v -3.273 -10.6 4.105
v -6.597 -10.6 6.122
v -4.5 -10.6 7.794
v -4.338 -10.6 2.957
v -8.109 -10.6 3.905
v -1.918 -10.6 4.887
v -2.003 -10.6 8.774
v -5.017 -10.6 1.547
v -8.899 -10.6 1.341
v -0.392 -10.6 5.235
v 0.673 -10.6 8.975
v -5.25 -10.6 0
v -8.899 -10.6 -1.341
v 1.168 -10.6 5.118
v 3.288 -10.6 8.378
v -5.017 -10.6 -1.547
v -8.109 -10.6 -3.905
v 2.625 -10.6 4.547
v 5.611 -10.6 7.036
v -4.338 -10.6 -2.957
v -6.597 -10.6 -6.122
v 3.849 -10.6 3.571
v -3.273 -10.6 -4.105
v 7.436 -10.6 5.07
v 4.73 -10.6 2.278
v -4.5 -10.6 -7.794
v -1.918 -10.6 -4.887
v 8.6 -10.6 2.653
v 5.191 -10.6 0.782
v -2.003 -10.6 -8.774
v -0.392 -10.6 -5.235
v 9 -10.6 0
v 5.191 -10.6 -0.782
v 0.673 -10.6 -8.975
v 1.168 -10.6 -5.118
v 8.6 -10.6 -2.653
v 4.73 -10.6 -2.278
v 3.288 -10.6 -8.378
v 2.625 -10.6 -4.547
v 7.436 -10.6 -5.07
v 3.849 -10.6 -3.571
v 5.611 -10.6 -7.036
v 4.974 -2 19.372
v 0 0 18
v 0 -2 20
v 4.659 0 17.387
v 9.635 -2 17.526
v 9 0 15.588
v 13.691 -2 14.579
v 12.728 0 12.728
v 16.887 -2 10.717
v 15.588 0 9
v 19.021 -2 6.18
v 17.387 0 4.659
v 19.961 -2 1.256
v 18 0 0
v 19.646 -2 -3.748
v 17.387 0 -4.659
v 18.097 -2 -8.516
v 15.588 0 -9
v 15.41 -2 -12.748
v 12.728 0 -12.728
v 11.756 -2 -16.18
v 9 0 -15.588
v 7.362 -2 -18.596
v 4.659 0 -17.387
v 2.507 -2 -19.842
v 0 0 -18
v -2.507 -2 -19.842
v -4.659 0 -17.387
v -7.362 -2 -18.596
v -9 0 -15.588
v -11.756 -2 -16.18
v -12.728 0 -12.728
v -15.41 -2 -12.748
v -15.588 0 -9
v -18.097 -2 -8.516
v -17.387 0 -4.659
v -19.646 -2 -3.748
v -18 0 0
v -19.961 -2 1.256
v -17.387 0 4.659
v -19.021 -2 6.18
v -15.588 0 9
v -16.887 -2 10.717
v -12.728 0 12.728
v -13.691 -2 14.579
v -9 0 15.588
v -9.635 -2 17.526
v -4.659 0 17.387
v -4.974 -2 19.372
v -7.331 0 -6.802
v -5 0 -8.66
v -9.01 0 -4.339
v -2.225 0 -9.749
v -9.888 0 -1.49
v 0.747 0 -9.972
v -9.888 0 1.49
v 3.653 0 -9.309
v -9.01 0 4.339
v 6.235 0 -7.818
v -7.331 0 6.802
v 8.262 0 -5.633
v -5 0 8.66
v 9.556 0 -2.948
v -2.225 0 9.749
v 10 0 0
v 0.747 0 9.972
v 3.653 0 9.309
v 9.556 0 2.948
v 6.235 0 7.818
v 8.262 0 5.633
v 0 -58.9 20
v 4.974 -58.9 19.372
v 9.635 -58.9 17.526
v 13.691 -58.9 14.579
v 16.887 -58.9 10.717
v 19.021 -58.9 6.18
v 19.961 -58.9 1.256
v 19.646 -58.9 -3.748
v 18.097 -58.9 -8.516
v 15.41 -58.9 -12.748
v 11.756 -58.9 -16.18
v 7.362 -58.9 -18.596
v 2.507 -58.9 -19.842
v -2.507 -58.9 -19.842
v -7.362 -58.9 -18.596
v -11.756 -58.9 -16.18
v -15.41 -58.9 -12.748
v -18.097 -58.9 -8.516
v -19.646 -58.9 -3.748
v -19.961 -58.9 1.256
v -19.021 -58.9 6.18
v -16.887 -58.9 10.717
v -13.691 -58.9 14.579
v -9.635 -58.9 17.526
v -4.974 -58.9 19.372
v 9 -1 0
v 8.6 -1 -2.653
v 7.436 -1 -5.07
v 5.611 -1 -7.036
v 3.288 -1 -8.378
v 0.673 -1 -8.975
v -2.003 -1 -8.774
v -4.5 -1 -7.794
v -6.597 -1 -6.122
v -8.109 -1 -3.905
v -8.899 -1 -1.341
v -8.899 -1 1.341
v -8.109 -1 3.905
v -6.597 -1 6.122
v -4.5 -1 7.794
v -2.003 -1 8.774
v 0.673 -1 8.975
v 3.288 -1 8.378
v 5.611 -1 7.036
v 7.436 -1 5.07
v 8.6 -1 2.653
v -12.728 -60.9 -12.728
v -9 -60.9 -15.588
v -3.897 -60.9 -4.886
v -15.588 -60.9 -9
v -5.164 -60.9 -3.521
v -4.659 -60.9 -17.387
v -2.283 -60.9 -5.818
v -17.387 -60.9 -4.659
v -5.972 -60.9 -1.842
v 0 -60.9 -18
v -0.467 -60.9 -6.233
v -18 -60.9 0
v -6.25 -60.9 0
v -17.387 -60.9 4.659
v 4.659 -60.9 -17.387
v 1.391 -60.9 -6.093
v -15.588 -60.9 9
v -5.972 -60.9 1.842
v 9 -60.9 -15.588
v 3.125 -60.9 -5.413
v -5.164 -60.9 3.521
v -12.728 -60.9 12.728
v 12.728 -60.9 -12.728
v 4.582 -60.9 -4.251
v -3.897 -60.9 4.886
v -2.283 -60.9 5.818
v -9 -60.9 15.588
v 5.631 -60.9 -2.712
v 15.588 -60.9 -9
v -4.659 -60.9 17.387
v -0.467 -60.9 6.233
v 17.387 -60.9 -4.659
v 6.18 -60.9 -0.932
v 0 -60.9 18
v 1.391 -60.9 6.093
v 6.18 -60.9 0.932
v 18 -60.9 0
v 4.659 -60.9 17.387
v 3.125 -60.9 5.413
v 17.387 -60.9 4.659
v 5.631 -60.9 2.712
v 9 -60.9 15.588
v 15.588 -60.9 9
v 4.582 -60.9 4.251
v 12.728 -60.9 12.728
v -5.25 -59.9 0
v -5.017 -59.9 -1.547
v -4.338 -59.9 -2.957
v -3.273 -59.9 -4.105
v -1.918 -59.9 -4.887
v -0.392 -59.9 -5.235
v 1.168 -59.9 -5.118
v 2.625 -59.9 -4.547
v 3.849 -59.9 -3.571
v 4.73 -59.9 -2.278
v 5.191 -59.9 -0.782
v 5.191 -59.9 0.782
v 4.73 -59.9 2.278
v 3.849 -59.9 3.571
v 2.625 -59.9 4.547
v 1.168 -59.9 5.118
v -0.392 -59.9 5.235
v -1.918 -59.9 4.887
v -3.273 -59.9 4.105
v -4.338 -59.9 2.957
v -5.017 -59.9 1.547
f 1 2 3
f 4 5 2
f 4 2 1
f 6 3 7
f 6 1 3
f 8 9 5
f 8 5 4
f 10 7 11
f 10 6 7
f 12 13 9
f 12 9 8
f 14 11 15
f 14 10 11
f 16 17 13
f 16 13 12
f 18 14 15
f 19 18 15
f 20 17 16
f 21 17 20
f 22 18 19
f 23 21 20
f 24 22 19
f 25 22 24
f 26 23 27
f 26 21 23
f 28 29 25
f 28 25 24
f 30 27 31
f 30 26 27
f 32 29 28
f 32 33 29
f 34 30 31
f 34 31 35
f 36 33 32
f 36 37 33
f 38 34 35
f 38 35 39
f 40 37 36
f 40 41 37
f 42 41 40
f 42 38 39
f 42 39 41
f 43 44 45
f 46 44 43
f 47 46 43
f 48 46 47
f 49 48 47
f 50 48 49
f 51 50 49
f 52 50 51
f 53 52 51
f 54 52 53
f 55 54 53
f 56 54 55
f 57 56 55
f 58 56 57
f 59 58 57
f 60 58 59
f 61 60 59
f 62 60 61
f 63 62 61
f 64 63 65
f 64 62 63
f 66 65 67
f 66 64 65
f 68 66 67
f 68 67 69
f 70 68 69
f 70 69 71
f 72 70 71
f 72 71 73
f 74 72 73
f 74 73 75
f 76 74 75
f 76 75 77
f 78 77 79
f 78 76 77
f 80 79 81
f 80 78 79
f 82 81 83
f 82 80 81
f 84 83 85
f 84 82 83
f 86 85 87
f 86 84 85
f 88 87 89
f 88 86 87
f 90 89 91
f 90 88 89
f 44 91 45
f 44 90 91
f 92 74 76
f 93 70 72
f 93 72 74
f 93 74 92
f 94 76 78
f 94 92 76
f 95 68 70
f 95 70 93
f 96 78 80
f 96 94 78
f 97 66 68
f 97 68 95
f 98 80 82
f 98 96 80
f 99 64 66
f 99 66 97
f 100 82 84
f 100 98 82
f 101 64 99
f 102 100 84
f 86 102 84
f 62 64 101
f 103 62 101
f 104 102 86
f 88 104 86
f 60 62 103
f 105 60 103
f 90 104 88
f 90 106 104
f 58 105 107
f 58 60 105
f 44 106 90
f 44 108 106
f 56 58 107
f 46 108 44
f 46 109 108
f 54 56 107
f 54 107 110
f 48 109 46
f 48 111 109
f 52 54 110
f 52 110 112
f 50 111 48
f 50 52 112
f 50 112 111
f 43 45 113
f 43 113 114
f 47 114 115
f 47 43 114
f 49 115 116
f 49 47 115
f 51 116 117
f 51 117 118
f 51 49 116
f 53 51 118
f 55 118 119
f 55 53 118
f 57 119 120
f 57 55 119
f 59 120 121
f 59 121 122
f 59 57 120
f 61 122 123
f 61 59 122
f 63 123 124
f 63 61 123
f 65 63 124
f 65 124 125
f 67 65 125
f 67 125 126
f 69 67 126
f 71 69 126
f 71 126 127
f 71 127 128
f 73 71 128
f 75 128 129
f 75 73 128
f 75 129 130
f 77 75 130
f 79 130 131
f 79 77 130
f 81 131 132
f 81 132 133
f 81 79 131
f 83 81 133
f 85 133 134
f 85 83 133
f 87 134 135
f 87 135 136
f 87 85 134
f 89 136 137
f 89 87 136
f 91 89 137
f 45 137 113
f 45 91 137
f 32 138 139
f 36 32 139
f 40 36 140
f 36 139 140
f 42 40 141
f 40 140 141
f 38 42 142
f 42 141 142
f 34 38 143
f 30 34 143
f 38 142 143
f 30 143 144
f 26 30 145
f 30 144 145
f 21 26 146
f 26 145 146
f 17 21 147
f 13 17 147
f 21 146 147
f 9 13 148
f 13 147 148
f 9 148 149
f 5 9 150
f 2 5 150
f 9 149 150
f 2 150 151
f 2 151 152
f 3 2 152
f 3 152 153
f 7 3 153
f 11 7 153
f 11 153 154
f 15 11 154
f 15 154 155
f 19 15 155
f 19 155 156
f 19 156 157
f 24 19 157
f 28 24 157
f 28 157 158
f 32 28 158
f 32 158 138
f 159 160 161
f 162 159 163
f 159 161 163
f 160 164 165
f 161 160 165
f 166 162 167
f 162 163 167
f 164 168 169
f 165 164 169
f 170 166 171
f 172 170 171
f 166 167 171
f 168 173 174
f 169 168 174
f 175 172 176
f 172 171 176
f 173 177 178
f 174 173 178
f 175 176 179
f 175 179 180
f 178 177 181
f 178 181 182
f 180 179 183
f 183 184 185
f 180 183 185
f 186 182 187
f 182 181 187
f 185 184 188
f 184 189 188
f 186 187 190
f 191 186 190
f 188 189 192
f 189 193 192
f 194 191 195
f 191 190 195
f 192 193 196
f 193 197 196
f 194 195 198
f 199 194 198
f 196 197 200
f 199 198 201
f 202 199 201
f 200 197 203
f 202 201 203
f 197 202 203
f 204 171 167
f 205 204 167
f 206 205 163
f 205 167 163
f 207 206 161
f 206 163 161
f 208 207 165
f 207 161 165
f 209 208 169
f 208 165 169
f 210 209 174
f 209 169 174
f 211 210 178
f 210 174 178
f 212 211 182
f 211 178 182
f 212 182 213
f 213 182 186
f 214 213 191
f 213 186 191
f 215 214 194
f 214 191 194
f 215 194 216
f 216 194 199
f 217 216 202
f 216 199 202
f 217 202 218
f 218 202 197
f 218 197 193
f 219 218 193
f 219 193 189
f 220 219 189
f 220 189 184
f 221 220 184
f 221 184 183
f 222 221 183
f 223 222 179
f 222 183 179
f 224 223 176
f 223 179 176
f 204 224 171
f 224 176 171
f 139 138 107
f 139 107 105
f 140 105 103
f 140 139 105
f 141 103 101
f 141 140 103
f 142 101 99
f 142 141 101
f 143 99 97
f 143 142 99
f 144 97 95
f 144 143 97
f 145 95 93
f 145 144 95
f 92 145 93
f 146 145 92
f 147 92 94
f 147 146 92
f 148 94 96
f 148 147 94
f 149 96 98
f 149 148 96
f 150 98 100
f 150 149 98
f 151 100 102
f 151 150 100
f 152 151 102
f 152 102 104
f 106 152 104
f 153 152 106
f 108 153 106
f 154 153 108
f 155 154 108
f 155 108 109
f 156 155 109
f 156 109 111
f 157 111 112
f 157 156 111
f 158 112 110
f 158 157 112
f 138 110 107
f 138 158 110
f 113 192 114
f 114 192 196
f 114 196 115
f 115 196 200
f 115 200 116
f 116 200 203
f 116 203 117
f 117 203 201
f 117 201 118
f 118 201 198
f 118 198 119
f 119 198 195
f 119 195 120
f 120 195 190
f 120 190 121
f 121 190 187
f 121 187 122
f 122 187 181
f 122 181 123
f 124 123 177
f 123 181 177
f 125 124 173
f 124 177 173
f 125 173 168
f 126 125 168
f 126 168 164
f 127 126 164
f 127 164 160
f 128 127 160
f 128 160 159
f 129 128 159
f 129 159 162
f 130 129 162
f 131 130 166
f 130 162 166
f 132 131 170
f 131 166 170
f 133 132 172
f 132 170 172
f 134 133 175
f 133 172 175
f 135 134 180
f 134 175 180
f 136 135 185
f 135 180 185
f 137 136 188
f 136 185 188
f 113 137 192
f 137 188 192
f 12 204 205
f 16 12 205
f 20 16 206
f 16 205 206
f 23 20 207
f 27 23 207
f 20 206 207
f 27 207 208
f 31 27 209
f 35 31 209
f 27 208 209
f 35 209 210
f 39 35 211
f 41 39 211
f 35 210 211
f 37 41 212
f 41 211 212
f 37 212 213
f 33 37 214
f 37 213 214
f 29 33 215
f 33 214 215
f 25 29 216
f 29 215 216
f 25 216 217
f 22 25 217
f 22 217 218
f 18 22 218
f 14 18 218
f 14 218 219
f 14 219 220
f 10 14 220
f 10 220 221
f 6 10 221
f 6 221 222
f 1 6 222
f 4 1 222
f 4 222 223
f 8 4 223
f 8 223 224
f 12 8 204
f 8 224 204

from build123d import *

# Parameters (mm, degrees)
SKETCH1_R                                            = 20
BOSS_EXTRUDE1_DEPTH                                  = 60.9
CBORE_FOR_M10_HEX_SOCKET_HEAD_CAP_SCREW1_D           = 10.5
CBORE_FOR_M10_HEX_SOCKET_HEAD_CAP_SCREW1_CBORE_D     = 18
CBORE_FOR_M10_HEX_SOCKET_HEAD_CAP_SCREW1_CBORE_DEPTH = 10.6
CHAMFER1_SIZE                                        = 2
CHAMFER2_SIZE                                        = 1
CHAMFER3_SIZE                                        = 1


with BuildPart() as part:
    # Sketch1 → Boss-Extrude1 (new body)
    with BuildSketch(Plane(origin=(0, 0, 0), x_dir=(1, 0, 0), z_dir=(0, 1, 0))):
        with Locations(Location((0, 0, 0), (0, 0, 270))):
            Circle(SKETCH1_R)
    extrude(amount=-BOSS_EXTRUDE1_DEPTH)

    # CBORE for M10 Hex Socket Head Cap Screw1 (through all)
    with Locations(Plane(origin=(0, 0, 0), x_dir=(1, 0, 0), z_dir=(0, 1, 0))):
        with Locations((0, 0)):
            CounterBoreHole(CBORE_FOR_M10_HEX_SOCKET_HEAD_CAP_SCREW1_D / 2, CBORE_FOR_M10_HEX_SOCKET_HEAD_CAP_SCREW1_CBORE_D / 2, CBORE_FOR_M10_HEX_SOCKET_HEAD_CAP_SCREW1_CBORE_DEPTH)

    # Chamfer1
    chamfer1_edges = [part.edges().sort_by_distance(p)[0] for p in [
        (0, 0, -20),
        (0, -60.9, -20),
    ]]
    chamfer(chamfer1_edges, length=CHAMFER1_SIZE)

    # Chamfer2
    chamfer2_edges = [part.edges().sort_by_distance(p)[0] for p in [
        (-9, 0, 0),
    ]]
    chamfer(chamfer2_edges, length=CHAMFER2_SIZE)

    # Chamfer3
    chamfer3_edges = [part.edges().sort_by_distance(p)[0] for p in [
        (5.25, -60.9, 0),
    ]]
    chamfer(chamfer3_edges, length=CHAMFER3_SIZE)


solid = part.part
